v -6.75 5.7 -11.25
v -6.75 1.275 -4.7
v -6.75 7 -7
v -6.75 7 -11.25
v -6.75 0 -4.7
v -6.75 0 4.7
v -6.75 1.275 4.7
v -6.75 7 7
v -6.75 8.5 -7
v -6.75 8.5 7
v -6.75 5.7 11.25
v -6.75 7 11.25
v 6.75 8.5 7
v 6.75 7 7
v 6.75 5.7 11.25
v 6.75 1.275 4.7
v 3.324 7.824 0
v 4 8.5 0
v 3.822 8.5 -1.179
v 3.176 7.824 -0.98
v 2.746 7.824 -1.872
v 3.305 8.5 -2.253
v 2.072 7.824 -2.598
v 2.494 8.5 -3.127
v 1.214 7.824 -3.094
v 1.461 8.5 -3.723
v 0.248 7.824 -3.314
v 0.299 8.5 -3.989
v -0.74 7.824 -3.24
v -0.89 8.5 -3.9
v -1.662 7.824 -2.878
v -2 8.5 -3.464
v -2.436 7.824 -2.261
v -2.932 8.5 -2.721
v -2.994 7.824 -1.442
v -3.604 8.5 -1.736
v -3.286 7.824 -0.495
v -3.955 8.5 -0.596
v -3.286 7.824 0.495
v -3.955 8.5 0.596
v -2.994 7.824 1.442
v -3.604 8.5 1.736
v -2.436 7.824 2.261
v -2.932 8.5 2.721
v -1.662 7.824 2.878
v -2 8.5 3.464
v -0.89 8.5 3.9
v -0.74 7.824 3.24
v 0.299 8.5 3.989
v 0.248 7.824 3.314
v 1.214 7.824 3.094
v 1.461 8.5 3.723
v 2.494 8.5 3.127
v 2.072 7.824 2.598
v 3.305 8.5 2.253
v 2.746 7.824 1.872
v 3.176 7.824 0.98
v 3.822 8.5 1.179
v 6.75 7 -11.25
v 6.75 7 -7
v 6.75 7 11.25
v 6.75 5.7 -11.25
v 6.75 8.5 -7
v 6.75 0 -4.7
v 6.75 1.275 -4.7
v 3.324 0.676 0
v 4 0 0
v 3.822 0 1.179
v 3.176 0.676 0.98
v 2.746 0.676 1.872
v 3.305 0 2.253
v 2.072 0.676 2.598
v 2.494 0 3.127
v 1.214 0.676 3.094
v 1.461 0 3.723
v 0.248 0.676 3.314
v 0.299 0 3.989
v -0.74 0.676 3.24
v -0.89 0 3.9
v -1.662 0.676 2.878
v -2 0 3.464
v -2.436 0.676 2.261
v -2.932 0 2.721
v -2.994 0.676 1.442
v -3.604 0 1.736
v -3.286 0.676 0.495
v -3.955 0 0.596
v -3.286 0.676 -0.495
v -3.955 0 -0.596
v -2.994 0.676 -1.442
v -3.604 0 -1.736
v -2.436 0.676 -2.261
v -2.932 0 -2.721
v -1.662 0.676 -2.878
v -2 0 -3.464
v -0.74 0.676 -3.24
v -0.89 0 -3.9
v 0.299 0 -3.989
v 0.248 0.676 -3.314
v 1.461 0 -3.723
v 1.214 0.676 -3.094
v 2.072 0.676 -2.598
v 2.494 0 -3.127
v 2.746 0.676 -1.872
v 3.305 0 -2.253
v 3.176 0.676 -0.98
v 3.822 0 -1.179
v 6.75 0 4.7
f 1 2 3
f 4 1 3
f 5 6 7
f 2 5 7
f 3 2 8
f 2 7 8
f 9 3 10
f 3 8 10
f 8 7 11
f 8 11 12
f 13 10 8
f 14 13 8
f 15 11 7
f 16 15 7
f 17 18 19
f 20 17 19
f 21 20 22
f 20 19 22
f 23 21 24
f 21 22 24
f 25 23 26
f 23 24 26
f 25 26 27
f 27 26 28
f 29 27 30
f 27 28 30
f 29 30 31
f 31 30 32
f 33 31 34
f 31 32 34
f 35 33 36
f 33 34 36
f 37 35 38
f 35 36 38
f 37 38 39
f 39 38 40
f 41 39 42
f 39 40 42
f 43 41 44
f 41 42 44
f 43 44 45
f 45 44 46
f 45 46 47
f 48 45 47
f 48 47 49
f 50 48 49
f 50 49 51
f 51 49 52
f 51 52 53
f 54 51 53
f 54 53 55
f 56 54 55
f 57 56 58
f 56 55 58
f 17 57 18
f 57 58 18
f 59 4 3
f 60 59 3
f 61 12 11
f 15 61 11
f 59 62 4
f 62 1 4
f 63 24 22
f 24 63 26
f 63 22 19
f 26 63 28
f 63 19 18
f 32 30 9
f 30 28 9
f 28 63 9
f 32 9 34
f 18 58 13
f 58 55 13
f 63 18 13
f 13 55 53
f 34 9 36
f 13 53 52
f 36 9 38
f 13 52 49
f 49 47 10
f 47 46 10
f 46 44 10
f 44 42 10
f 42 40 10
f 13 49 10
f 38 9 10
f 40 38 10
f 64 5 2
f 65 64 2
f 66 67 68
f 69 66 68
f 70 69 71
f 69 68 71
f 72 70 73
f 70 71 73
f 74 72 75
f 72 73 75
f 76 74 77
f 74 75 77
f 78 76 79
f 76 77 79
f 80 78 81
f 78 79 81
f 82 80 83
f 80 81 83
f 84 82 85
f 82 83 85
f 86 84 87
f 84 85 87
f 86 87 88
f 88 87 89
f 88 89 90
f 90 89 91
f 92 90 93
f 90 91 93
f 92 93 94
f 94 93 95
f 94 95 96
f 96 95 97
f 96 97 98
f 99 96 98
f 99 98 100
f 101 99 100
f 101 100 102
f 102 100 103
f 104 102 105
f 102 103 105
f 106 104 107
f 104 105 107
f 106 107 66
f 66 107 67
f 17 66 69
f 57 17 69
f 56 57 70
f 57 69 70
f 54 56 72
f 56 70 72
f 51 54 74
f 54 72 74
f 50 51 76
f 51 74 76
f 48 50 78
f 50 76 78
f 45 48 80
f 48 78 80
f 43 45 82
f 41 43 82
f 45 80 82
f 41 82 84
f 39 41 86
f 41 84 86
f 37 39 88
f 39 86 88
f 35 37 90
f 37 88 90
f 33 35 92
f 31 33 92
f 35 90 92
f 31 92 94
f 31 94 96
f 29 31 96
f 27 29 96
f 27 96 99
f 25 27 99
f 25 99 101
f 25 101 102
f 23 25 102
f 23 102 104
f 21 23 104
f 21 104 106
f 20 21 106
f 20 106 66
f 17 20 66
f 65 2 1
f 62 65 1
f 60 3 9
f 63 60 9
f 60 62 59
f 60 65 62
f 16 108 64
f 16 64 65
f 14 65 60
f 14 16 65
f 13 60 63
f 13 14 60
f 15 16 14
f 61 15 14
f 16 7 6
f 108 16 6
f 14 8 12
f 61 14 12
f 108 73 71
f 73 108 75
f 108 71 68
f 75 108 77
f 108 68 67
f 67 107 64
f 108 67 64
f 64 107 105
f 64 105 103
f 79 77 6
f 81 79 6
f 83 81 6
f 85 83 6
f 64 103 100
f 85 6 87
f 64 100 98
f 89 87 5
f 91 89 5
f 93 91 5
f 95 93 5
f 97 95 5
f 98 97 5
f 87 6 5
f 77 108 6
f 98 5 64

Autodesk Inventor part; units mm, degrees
sketch "Skizze_1" plane through (0, 0, 0) normal (1, 0, 0) x (0, 1, 0)
  line L0 (5.7, 11.25) -> (1.275, 4.7)
  line L1 (1.275, 4.7) -> (0, 4.7)
  line L2 (0, 4.7) -> (0, -4.7)
  line L3 (0, -4.7) -> (1.275, -4.7)
  line L4 (1.275, -4.7) -> (5.7, -11.25)
  line L5 (5.7, -11.25) -> (7, -11.25)
  line L6 (7, -11.25) -> (7, -7)
  line L7 (7, -7) -> (8.5, -7)
  line L8 (8.5, -7) -> (8.5, 7)
  line L9 (8.5, 7) -> (7, 7)
  line L10 (7, 7) -> (7, 11.25)
  line L11 (7, 11.25) -> (5.7, 11.25)
extrude "Extrusion1" add sketch "Skizze_1" along normal mid plane 13.5
sketch "Skizze_2" plane through (0, 0, 0) normal (0, 0, 1) x (1, 0, 0)
  line L0 (0, 0) -> (0, 8.5)
  line L1 (0, 8.5) -> (4, 8.5)
  line L2 (4, 8.5) -> (3.3235, 7.8235)
  line L3 (3.3235, 7.8235) -> (3.3235, 0.6765)
  line L4 (3.3235, 0.6765) -> (4, 0)
  line L5 (4, 0) -> (0, 0)
  line L6 (0, 0) -> (0, 8.5)
revolve "Revolution1" cut sketch "Skizze_2" angle 360 about axis through (0, 0, 0) along (0, -1, 0)
thread "Thread1" size "M8x1.25" class "6H" standard "ISO Metric profile" full length
ref_plane "TIN_4_XY" through (0, 8.5, 0) normal (0, 1, 0) x (1, 0, 0)
ref_plane "TIN_4_YZ" through (0, 8.5, 0) normal (1, 0, 0) x (0, 0, -1)
ref_plane "TIN_4_ZX" through (0, 8.5, 0) normal (0, 0, -1) x (0, 1, 0)
properties part number "Robotunits TIN_4508"
